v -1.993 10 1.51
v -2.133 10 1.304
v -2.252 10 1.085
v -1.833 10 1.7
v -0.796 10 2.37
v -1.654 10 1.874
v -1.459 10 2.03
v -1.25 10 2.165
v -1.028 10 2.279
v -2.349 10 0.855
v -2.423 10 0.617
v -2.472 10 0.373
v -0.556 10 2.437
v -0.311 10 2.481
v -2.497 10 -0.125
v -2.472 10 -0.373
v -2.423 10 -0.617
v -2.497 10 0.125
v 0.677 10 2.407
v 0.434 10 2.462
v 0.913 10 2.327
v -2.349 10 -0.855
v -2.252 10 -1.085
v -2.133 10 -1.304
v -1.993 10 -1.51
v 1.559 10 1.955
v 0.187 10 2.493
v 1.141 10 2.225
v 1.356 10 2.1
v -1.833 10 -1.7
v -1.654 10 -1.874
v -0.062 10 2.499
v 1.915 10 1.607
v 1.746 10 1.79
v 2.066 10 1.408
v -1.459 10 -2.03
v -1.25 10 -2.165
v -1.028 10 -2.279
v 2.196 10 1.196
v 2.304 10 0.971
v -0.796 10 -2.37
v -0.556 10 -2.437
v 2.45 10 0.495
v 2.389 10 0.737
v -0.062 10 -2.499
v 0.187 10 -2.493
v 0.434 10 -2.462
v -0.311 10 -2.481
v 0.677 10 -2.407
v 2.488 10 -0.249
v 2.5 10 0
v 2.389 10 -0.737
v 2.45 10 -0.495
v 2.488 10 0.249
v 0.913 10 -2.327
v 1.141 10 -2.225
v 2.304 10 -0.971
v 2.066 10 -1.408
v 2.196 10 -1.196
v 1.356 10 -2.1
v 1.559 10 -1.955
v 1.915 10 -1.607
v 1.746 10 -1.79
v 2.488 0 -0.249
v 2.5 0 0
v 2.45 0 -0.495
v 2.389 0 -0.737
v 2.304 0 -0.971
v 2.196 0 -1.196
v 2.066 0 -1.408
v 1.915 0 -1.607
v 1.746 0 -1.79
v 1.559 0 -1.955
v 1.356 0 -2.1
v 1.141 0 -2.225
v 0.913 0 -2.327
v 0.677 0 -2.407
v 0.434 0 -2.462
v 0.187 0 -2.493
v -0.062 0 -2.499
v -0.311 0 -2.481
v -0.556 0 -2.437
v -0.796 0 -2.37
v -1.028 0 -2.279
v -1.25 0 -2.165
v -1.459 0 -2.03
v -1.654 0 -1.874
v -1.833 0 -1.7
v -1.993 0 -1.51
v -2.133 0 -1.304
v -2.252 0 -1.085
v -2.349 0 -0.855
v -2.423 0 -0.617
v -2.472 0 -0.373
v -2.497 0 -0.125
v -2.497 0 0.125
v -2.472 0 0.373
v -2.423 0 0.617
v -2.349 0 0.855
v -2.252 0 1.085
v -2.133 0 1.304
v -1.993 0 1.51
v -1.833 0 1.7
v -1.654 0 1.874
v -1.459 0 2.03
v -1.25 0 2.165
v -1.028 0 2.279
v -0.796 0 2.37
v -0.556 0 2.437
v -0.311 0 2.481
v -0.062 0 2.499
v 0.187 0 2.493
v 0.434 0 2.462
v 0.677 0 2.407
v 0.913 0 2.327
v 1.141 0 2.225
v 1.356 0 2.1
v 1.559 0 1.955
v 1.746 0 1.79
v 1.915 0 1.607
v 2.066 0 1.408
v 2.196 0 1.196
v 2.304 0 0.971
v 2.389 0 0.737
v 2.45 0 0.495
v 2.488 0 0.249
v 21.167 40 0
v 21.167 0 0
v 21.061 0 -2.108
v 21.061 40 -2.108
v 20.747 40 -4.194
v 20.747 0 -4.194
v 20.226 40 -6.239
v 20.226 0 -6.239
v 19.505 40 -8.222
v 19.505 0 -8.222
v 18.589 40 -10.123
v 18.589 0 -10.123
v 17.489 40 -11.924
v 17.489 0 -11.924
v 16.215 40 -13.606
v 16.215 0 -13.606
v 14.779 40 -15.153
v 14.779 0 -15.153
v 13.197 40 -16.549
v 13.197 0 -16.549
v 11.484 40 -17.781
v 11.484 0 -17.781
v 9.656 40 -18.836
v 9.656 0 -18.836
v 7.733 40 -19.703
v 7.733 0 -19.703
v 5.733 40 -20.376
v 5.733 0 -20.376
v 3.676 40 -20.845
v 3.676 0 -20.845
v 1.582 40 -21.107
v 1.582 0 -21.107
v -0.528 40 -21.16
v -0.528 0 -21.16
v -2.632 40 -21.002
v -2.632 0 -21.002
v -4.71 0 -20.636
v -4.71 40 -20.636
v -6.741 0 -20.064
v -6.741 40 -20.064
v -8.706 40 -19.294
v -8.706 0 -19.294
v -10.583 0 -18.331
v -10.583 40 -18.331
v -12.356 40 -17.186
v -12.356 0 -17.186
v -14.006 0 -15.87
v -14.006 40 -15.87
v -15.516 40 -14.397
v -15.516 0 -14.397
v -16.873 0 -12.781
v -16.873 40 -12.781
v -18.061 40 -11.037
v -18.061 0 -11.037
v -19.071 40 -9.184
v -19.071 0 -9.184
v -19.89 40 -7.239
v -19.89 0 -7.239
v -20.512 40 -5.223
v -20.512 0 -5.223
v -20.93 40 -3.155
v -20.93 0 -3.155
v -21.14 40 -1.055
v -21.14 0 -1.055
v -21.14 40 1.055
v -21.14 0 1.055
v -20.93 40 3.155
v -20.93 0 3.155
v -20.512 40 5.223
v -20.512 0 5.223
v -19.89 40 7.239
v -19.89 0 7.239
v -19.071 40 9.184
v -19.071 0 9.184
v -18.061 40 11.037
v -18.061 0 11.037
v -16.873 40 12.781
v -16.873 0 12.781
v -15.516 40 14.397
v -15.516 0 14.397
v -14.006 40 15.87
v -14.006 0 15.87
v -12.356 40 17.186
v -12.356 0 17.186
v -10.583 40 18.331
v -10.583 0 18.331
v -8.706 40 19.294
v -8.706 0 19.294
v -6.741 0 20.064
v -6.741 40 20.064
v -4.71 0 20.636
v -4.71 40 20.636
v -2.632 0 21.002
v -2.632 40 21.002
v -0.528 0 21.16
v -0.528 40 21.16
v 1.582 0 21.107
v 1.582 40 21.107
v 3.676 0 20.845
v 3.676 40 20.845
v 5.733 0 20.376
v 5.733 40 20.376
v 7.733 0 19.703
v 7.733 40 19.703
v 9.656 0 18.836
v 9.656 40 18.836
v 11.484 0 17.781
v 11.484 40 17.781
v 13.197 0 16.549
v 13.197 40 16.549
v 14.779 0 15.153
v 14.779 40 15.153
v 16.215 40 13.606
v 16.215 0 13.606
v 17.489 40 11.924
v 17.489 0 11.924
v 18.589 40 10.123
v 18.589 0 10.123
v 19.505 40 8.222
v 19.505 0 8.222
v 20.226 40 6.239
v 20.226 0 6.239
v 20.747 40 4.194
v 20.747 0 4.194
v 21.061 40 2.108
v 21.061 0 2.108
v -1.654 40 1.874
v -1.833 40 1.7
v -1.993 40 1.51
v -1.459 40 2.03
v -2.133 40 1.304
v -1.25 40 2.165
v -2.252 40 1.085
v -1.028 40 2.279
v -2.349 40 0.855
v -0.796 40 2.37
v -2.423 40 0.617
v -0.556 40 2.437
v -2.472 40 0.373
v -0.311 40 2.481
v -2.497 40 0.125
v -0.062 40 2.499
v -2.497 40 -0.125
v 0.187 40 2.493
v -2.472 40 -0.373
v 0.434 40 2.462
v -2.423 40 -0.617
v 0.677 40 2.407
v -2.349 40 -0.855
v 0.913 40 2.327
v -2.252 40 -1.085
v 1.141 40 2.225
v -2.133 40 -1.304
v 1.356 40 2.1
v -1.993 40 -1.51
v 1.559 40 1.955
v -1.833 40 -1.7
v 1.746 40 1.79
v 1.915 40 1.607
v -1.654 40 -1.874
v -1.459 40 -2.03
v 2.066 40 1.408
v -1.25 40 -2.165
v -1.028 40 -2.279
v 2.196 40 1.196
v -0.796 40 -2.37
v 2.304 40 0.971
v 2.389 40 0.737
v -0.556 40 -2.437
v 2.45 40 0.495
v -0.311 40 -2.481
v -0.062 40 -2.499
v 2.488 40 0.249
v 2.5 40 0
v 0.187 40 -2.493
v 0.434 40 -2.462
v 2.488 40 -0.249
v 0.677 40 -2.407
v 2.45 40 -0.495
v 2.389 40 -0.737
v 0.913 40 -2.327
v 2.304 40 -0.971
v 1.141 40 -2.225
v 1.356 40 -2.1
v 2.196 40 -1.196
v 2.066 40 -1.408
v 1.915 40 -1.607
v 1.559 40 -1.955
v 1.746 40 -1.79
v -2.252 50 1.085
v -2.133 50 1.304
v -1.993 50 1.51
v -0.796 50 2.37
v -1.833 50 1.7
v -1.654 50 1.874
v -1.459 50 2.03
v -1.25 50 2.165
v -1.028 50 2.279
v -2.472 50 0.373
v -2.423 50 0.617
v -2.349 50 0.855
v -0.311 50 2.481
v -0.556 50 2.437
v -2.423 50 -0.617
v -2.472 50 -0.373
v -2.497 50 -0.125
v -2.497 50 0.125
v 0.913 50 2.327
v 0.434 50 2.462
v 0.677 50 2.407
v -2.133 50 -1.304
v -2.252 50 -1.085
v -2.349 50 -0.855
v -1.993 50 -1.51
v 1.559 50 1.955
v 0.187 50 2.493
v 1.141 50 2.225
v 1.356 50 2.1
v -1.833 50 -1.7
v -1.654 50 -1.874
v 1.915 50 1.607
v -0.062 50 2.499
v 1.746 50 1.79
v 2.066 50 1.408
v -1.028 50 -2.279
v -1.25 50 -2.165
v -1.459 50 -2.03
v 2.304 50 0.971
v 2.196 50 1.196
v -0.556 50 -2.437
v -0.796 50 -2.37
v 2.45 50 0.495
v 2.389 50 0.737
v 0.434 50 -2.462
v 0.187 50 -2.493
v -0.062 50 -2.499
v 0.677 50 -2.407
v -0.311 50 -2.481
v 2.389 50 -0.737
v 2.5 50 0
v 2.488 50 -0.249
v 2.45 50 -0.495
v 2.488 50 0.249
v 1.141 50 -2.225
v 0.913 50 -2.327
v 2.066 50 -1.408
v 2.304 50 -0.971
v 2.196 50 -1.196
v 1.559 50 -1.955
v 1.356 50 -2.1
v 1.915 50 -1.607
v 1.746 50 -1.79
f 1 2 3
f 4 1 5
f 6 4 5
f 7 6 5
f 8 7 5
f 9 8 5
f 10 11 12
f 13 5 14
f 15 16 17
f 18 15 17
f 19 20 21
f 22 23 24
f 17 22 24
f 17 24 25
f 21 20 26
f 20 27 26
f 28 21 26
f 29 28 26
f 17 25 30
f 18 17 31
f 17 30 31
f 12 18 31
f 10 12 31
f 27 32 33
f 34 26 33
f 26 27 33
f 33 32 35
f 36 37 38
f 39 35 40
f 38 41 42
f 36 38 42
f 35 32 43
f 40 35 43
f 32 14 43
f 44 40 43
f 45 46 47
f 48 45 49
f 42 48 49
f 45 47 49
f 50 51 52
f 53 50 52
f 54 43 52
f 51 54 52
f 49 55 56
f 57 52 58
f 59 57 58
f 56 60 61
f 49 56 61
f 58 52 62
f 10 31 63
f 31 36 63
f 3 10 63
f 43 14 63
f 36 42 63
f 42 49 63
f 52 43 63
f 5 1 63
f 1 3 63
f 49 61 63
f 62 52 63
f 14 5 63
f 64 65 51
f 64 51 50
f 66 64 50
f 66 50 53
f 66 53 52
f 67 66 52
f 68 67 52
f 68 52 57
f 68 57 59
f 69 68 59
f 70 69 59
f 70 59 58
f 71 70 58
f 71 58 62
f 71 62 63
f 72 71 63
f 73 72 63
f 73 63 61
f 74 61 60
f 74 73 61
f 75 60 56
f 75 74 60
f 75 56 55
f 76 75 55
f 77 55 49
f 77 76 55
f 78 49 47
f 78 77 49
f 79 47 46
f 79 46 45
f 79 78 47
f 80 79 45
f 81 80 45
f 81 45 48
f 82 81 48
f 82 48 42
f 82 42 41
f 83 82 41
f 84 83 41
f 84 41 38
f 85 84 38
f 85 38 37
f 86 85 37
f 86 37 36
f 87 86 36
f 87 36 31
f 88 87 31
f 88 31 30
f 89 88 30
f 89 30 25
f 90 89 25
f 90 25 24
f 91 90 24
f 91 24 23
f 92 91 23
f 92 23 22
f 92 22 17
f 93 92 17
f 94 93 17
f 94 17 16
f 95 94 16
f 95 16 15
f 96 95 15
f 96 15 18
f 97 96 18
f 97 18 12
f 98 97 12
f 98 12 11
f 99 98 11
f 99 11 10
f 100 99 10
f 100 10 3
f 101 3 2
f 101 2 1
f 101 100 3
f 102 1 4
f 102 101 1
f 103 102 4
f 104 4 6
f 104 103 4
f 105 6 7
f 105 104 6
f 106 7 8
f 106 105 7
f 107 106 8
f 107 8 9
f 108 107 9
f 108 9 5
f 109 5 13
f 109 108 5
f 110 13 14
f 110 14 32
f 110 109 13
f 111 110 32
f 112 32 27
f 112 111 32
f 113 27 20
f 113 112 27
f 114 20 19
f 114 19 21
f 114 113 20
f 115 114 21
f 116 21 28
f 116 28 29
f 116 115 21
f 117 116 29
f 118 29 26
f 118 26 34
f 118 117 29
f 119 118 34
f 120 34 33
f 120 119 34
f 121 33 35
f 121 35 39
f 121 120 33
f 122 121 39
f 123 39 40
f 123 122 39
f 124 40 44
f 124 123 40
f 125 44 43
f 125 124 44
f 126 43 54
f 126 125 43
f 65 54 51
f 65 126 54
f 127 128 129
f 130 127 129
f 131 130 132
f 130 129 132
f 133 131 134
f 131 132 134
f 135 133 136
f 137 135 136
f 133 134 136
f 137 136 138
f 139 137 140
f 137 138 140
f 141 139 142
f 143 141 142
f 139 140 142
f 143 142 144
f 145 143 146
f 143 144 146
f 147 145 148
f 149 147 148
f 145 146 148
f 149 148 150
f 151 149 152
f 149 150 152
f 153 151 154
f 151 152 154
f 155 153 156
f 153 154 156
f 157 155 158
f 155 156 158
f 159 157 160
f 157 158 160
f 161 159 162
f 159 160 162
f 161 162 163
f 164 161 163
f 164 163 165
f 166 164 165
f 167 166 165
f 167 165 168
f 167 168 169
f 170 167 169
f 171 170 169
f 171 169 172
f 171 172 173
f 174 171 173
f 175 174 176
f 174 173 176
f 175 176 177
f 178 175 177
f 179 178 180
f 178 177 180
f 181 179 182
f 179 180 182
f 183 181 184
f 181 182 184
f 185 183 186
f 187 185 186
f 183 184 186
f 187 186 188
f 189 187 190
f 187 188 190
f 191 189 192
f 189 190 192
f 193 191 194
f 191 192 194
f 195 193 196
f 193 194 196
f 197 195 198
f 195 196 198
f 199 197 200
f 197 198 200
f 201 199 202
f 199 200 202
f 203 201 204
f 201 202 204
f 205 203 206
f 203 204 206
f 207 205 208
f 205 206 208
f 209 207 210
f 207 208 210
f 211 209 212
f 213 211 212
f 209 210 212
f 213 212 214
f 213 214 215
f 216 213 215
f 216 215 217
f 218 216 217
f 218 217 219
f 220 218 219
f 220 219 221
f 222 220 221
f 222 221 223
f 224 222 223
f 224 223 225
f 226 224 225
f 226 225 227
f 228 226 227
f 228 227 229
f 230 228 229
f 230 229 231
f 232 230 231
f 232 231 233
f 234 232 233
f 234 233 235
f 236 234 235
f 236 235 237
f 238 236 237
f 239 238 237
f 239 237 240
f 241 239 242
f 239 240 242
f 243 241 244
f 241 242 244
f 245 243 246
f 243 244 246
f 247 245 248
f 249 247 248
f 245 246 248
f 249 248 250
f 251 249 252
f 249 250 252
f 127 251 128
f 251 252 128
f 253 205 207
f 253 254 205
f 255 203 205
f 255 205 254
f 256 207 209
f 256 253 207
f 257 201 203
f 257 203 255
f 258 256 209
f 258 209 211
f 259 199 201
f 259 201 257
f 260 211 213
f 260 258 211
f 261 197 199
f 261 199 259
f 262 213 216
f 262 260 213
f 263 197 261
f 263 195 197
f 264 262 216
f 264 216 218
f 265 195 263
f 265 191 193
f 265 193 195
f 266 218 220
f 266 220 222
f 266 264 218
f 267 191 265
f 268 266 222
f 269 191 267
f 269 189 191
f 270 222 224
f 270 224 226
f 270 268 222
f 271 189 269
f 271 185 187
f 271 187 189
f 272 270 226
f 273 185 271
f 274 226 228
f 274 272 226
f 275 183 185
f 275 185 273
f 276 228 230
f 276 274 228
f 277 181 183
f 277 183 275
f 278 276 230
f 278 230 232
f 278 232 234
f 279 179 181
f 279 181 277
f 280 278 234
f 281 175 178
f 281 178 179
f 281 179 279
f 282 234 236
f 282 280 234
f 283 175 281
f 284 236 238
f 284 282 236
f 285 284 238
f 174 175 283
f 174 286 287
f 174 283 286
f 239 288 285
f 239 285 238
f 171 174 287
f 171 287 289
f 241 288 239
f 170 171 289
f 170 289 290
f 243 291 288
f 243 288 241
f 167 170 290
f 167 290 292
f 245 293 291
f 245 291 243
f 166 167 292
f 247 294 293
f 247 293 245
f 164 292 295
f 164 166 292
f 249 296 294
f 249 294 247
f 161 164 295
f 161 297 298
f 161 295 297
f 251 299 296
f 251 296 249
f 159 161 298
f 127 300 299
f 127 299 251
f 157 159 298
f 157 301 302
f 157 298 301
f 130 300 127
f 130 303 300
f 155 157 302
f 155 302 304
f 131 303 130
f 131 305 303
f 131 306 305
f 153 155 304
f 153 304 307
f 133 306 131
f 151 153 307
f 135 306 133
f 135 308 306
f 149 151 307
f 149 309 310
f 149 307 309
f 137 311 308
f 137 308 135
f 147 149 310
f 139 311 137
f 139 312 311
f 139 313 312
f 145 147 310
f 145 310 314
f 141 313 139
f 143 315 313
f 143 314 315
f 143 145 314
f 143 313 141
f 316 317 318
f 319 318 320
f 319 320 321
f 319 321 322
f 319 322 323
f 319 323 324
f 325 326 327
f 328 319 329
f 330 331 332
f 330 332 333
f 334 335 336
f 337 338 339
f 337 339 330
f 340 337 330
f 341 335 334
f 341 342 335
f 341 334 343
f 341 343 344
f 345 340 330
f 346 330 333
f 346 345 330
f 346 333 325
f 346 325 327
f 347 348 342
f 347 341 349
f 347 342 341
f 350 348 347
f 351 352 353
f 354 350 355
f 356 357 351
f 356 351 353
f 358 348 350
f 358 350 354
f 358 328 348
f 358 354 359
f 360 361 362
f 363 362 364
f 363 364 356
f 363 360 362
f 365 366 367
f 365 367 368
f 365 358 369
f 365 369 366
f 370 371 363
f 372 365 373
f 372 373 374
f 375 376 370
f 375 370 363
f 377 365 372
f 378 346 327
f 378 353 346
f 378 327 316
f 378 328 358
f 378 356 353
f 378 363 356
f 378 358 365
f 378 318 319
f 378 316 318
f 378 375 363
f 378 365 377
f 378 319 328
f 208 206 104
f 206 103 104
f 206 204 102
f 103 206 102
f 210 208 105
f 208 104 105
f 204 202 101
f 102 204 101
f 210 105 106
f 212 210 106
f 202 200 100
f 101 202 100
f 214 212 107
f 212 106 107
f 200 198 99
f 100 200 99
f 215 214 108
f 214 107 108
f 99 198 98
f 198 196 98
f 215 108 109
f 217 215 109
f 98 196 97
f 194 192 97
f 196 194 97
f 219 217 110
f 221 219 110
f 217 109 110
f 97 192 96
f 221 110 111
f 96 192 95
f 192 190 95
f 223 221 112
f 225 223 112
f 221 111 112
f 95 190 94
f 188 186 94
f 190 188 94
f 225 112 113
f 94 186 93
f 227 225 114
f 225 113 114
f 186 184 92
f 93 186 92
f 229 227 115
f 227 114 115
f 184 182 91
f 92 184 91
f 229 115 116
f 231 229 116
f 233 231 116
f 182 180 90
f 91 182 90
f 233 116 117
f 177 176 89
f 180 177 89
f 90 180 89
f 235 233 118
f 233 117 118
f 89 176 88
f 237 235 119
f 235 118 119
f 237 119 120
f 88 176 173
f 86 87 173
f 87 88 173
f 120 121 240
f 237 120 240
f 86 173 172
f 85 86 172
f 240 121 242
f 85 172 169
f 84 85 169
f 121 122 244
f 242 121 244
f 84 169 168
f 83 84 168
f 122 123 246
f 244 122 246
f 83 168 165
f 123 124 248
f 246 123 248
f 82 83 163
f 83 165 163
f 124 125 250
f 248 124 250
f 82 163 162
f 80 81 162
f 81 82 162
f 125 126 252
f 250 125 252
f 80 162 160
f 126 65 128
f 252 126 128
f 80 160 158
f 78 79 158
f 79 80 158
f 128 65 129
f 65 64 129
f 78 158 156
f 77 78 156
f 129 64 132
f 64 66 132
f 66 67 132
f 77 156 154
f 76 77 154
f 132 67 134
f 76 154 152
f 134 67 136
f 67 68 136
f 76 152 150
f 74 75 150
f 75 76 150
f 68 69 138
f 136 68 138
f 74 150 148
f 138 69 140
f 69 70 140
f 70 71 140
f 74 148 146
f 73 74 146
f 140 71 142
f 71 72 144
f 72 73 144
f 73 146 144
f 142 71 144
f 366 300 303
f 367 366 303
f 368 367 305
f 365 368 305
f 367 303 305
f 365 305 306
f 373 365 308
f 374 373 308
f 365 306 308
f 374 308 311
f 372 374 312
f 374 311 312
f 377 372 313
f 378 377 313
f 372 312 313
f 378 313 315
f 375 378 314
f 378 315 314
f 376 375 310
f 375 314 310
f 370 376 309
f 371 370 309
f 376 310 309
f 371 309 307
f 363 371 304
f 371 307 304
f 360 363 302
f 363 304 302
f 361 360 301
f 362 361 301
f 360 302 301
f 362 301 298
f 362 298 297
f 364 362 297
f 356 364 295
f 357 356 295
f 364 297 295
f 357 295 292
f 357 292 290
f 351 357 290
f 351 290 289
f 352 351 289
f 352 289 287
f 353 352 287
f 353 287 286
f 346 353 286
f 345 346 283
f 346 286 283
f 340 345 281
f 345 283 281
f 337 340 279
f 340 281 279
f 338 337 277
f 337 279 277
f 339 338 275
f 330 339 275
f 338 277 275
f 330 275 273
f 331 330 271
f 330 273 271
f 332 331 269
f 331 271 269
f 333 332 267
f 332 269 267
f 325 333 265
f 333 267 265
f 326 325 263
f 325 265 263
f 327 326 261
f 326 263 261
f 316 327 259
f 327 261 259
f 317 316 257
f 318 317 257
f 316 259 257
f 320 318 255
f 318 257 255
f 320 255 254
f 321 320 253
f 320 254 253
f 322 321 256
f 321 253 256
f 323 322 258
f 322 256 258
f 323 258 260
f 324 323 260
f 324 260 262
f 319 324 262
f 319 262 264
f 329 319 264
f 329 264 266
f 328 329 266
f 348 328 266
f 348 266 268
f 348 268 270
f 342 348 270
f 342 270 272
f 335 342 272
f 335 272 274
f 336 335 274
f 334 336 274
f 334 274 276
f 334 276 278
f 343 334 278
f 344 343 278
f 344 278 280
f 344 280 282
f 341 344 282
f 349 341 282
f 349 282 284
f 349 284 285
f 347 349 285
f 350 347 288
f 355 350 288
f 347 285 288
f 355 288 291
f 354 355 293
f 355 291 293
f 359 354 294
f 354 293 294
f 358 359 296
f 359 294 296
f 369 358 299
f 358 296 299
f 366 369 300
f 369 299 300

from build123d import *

# Parameters (mm, degrees)
SKETCH1_R                = 21.166666667
SKETCH1_R_2              = 2.5
BOSS_EXTRUDE1_DEPTH      = 40
SKETCH2_R                = 2.5
BOSS_EXTRUDE2_DEPTH      = 10
BOSS_EXTRUDE2_DEPTH_BACK = 30


with BuildPart() as part:
    # Sketch1 → Boss-Extrude1 (new body)
    with BuildSketch(Plane(origin=(0, 0, 0), x_dir=(1, 0, 0), z_dir=(0, 1, 0))):
        Circle(SKETCH1_R)
        Circle(SKETCH1_R_2, mode=Mode.SUBTRACT)
    extrude(amount=BOSS_EXTRUDE1_DEPTH)

    # Sketch2 → Boss-Extrude2 (add, two sides)
    with BuildSketch(Plane(origin=(0, 40, 0), x_dir=(1, 0, 0), z_dir=(0, 1, 0))) as boss_extrude2_sk:
        Circle(SKETCH2_R)
    extrude(amount=BOSS_EXTRUDE2_DEPTH)
    extrude(boss_extrude2_sk.sketch, amount=-BOSS_EXTRUDE2_DEPTH_BACK)


solid = part.part
